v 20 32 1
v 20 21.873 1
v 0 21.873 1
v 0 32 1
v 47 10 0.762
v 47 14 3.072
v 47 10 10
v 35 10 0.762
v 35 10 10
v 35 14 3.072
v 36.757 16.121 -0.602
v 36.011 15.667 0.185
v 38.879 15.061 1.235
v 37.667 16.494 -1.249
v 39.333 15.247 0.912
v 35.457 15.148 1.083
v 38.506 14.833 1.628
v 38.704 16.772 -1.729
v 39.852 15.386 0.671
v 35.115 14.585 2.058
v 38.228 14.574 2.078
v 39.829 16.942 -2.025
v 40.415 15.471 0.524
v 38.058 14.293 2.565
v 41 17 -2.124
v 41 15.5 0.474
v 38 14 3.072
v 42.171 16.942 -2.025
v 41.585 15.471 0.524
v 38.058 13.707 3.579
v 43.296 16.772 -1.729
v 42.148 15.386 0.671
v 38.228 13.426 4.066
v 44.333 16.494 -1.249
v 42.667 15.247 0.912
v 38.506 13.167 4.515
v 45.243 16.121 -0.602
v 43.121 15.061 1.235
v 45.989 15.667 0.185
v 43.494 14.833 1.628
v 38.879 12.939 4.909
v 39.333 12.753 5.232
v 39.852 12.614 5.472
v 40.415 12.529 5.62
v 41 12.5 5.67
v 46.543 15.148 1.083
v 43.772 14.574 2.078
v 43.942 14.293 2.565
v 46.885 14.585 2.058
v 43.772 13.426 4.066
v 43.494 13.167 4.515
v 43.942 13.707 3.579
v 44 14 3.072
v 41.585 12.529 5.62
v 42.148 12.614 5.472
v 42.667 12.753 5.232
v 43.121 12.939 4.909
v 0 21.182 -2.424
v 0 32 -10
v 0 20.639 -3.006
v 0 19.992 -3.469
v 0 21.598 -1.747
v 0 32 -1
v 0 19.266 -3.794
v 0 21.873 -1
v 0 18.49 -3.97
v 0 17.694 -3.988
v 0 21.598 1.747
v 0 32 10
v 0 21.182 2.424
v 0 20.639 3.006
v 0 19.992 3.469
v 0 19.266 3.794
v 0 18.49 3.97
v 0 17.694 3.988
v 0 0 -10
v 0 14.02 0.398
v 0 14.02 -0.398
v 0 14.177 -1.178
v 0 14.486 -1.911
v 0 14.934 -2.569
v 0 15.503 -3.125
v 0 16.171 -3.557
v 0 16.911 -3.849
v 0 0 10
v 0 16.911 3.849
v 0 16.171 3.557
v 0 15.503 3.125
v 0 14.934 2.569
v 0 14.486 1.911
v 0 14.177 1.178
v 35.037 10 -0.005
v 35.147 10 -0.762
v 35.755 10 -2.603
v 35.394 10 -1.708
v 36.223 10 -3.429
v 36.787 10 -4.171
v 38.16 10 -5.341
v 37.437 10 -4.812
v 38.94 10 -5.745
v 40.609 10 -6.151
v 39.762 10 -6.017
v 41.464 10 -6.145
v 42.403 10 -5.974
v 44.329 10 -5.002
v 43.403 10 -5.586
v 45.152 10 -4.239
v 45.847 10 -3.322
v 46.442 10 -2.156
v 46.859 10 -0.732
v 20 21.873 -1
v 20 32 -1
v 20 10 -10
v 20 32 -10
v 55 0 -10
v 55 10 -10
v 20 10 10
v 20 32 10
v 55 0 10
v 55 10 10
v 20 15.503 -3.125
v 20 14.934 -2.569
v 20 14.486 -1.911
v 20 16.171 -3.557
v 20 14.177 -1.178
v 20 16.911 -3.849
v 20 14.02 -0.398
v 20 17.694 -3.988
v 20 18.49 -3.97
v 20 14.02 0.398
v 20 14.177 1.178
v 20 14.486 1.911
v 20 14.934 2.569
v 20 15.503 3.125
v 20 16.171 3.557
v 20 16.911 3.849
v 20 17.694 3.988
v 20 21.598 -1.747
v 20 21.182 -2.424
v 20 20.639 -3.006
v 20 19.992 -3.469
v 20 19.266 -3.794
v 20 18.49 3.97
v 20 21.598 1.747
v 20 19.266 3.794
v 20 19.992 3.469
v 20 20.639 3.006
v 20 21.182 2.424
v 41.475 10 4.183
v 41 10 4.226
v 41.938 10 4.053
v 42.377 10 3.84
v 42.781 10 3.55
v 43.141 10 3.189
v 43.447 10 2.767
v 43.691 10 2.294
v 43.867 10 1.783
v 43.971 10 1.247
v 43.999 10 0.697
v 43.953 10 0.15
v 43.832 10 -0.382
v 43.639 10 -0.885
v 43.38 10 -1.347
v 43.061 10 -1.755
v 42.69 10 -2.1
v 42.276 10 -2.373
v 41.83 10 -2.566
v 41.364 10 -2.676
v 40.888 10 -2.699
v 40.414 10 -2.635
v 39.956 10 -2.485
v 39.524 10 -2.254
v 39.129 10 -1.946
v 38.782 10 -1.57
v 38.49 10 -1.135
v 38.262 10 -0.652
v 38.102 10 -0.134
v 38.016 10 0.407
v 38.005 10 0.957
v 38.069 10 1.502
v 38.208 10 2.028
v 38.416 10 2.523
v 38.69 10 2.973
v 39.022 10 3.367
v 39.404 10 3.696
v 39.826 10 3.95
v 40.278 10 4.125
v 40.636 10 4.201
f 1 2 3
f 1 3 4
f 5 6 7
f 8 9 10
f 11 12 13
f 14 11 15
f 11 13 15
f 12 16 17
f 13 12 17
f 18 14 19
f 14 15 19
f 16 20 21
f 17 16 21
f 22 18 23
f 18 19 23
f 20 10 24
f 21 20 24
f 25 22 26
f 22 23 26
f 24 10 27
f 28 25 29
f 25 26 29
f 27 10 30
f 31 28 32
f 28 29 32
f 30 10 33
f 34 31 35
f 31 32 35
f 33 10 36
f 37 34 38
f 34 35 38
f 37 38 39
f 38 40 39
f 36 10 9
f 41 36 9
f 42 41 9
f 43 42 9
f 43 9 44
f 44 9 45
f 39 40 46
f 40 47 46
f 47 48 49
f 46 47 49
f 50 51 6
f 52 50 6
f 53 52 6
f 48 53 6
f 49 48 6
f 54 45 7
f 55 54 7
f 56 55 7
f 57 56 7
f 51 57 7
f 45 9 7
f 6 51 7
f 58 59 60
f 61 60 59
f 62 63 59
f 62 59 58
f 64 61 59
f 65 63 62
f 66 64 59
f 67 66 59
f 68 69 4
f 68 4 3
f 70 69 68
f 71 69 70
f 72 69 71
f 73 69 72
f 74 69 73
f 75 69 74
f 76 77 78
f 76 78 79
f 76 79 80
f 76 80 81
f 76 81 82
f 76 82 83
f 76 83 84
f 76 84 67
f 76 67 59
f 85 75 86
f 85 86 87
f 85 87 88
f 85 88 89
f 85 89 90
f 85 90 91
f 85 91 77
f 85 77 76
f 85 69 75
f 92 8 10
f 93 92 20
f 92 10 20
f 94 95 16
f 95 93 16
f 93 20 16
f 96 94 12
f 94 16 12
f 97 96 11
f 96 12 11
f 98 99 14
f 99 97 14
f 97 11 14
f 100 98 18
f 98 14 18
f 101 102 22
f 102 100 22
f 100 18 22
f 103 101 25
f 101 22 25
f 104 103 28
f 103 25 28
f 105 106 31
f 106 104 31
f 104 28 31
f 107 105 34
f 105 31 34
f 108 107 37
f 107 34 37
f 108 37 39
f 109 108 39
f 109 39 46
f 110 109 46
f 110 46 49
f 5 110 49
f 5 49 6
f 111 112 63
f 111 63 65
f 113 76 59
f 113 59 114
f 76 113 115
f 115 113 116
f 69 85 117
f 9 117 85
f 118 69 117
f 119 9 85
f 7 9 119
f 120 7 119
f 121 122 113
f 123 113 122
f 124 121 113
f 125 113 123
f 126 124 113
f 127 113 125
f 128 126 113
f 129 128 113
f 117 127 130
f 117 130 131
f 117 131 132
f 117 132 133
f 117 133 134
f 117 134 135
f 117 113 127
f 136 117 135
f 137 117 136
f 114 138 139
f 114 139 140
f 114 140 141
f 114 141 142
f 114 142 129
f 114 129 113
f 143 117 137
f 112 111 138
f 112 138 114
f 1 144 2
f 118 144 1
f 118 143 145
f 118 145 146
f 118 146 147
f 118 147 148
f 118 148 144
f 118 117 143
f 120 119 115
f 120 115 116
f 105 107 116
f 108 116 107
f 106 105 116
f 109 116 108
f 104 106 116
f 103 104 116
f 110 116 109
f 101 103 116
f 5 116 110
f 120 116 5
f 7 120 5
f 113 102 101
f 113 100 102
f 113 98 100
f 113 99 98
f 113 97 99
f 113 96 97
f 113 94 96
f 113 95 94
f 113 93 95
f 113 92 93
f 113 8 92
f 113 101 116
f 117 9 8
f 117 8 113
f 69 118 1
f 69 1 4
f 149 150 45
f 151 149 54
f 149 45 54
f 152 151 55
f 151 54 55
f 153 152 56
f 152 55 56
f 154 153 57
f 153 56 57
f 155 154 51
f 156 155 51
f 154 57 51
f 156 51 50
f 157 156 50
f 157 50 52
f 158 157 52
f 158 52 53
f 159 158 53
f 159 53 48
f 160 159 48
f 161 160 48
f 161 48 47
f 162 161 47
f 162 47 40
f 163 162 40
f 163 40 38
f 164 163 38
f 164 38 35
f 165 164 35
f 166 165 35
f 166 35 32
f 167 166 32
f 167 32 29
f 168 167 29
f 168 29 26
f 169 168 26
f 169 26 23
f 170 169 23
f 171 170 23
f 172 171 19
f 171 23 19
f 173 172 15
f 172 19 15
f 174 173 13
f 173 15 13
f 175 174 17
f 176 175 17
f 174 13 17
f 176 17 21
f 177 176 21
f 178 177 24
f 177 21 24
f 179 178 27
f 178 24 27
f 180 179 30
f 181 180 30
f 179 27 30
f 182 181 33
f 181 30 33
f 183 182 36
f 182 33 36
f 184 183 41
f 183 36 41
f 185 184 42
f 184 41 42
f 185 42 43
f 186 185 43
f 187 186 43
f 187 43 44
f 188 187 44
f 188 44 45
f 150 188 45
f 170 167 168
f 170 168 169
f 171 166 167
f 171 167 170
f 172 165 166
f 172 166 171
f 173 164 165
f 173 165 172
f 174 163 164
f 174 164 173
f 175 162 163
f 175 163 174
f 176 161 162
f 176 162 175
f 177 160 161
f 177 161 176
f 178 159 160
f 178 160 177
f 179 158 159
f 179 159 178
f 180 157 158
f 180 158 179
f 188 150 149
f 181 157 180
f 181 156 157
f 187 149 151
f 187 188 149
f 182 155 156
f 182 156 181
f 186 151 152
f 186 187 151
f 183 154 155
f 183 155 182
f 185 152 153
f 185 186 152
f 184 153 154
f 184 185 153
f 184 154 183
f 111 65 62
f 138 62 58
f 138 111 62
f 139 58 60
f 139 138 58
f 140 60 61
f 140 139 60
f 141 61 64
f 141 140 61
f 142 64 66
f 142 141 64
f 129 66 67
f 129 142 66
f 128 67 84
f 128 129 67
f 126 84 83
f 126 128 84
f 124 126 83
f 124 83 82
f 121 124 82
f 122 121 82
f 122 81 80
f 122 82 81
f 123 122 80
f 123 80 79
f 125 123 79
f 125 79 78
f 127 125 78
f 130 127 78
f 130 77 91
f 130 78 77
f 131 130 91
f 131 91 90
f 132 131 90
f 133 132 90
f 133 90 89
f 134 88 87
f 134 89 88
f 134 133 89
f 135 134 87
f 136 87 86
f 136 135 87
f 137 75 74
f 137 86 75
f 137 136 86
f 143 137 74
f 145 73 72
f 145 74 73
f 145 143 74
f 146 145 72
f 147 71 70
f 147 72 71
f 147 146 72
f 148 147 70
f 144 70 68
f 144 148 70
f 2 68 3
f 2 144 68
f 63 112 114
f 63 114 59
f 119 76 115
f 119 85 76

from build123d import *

# Parameters (mm, degrees)
BOSS_EXTRUDE1_DEPTH = 10
CUT_EXTRUDE1_DEPTH  = 21
BOSS_EXTRUDE2_REACH = 20.66
SKETCH3_R           = 3


with BuildPart() as part:
    # Sketch1 → Boss-Extrude1 (new body, symmetric)
    with BuildSketch(Plane.XY):
        Polygon((0, 0), (55, 0), (55, 10), (20, 10), (20, 32), (0, 32), align=None)
    extrude(amount=BOSS_EXTRUDE1_DEPTH, both=True)

    # Sketch2 → Cut-Extrude1 (cut, through all)
    with BuildSketch(Plane(origin=(20, 0, 0), x_dir=(0, 0, -1), z_dir=(1, 0, 0))):
        with BuildLine():
            Line((-1, 32), (1, 32))
            Line((1, 32), (1, 21.872983346))
            ThreePointArc((1, 21.872983346), (0, 14), (-1, 21.872983346))
            Line((-1, 21.872983346), (-1, 32))
        make_face()
    extrude(amount=-CUT_EXTRUDE1_DEPTH, mode=Mode.SUBTRACT)

    # Sketch3 → Boss-Extrude2 (add, up to next)
    with BuildSketch(Plane(origin=(0, 11.830127019, 6.830127019), x_dir=(-1, 0, 0), z_dir=(0, 0.866025404, 0.5)), mode=Mode.PRIVATE) as boss_extrude2_sk1:
        with BuildLine():
            Line((-47, 3.660254038), (-35, 3.660254038))
            Line((-35, 3.660254038), (-35, -4.339745962))
            ThreePointArc((-35, -4.339745962), (-41, -10.339745962), (-47, -4.339745962))
            Line((-47, -4.339745962), (-47, 3.660254038))
        make_face()
        with Locations(Location((-41, -4.339745962, 0), (0, 0, 90))):  # turned: the seam where the file's is
            Circle(SKETCH3_R, mode=Mode.SUBTRACT)
    boss_extrude2_tool1 = extrude(boss_extrude2_sk1.sketch, amount=-BOSS_EXTRUDE2_REACH, mode=Mode.PRIVATE) - part.part
    add(boss_extrude2_tool1.solids().sort_by_distance((41, 10.092195, 9.840313))[0])


solid = part.part
